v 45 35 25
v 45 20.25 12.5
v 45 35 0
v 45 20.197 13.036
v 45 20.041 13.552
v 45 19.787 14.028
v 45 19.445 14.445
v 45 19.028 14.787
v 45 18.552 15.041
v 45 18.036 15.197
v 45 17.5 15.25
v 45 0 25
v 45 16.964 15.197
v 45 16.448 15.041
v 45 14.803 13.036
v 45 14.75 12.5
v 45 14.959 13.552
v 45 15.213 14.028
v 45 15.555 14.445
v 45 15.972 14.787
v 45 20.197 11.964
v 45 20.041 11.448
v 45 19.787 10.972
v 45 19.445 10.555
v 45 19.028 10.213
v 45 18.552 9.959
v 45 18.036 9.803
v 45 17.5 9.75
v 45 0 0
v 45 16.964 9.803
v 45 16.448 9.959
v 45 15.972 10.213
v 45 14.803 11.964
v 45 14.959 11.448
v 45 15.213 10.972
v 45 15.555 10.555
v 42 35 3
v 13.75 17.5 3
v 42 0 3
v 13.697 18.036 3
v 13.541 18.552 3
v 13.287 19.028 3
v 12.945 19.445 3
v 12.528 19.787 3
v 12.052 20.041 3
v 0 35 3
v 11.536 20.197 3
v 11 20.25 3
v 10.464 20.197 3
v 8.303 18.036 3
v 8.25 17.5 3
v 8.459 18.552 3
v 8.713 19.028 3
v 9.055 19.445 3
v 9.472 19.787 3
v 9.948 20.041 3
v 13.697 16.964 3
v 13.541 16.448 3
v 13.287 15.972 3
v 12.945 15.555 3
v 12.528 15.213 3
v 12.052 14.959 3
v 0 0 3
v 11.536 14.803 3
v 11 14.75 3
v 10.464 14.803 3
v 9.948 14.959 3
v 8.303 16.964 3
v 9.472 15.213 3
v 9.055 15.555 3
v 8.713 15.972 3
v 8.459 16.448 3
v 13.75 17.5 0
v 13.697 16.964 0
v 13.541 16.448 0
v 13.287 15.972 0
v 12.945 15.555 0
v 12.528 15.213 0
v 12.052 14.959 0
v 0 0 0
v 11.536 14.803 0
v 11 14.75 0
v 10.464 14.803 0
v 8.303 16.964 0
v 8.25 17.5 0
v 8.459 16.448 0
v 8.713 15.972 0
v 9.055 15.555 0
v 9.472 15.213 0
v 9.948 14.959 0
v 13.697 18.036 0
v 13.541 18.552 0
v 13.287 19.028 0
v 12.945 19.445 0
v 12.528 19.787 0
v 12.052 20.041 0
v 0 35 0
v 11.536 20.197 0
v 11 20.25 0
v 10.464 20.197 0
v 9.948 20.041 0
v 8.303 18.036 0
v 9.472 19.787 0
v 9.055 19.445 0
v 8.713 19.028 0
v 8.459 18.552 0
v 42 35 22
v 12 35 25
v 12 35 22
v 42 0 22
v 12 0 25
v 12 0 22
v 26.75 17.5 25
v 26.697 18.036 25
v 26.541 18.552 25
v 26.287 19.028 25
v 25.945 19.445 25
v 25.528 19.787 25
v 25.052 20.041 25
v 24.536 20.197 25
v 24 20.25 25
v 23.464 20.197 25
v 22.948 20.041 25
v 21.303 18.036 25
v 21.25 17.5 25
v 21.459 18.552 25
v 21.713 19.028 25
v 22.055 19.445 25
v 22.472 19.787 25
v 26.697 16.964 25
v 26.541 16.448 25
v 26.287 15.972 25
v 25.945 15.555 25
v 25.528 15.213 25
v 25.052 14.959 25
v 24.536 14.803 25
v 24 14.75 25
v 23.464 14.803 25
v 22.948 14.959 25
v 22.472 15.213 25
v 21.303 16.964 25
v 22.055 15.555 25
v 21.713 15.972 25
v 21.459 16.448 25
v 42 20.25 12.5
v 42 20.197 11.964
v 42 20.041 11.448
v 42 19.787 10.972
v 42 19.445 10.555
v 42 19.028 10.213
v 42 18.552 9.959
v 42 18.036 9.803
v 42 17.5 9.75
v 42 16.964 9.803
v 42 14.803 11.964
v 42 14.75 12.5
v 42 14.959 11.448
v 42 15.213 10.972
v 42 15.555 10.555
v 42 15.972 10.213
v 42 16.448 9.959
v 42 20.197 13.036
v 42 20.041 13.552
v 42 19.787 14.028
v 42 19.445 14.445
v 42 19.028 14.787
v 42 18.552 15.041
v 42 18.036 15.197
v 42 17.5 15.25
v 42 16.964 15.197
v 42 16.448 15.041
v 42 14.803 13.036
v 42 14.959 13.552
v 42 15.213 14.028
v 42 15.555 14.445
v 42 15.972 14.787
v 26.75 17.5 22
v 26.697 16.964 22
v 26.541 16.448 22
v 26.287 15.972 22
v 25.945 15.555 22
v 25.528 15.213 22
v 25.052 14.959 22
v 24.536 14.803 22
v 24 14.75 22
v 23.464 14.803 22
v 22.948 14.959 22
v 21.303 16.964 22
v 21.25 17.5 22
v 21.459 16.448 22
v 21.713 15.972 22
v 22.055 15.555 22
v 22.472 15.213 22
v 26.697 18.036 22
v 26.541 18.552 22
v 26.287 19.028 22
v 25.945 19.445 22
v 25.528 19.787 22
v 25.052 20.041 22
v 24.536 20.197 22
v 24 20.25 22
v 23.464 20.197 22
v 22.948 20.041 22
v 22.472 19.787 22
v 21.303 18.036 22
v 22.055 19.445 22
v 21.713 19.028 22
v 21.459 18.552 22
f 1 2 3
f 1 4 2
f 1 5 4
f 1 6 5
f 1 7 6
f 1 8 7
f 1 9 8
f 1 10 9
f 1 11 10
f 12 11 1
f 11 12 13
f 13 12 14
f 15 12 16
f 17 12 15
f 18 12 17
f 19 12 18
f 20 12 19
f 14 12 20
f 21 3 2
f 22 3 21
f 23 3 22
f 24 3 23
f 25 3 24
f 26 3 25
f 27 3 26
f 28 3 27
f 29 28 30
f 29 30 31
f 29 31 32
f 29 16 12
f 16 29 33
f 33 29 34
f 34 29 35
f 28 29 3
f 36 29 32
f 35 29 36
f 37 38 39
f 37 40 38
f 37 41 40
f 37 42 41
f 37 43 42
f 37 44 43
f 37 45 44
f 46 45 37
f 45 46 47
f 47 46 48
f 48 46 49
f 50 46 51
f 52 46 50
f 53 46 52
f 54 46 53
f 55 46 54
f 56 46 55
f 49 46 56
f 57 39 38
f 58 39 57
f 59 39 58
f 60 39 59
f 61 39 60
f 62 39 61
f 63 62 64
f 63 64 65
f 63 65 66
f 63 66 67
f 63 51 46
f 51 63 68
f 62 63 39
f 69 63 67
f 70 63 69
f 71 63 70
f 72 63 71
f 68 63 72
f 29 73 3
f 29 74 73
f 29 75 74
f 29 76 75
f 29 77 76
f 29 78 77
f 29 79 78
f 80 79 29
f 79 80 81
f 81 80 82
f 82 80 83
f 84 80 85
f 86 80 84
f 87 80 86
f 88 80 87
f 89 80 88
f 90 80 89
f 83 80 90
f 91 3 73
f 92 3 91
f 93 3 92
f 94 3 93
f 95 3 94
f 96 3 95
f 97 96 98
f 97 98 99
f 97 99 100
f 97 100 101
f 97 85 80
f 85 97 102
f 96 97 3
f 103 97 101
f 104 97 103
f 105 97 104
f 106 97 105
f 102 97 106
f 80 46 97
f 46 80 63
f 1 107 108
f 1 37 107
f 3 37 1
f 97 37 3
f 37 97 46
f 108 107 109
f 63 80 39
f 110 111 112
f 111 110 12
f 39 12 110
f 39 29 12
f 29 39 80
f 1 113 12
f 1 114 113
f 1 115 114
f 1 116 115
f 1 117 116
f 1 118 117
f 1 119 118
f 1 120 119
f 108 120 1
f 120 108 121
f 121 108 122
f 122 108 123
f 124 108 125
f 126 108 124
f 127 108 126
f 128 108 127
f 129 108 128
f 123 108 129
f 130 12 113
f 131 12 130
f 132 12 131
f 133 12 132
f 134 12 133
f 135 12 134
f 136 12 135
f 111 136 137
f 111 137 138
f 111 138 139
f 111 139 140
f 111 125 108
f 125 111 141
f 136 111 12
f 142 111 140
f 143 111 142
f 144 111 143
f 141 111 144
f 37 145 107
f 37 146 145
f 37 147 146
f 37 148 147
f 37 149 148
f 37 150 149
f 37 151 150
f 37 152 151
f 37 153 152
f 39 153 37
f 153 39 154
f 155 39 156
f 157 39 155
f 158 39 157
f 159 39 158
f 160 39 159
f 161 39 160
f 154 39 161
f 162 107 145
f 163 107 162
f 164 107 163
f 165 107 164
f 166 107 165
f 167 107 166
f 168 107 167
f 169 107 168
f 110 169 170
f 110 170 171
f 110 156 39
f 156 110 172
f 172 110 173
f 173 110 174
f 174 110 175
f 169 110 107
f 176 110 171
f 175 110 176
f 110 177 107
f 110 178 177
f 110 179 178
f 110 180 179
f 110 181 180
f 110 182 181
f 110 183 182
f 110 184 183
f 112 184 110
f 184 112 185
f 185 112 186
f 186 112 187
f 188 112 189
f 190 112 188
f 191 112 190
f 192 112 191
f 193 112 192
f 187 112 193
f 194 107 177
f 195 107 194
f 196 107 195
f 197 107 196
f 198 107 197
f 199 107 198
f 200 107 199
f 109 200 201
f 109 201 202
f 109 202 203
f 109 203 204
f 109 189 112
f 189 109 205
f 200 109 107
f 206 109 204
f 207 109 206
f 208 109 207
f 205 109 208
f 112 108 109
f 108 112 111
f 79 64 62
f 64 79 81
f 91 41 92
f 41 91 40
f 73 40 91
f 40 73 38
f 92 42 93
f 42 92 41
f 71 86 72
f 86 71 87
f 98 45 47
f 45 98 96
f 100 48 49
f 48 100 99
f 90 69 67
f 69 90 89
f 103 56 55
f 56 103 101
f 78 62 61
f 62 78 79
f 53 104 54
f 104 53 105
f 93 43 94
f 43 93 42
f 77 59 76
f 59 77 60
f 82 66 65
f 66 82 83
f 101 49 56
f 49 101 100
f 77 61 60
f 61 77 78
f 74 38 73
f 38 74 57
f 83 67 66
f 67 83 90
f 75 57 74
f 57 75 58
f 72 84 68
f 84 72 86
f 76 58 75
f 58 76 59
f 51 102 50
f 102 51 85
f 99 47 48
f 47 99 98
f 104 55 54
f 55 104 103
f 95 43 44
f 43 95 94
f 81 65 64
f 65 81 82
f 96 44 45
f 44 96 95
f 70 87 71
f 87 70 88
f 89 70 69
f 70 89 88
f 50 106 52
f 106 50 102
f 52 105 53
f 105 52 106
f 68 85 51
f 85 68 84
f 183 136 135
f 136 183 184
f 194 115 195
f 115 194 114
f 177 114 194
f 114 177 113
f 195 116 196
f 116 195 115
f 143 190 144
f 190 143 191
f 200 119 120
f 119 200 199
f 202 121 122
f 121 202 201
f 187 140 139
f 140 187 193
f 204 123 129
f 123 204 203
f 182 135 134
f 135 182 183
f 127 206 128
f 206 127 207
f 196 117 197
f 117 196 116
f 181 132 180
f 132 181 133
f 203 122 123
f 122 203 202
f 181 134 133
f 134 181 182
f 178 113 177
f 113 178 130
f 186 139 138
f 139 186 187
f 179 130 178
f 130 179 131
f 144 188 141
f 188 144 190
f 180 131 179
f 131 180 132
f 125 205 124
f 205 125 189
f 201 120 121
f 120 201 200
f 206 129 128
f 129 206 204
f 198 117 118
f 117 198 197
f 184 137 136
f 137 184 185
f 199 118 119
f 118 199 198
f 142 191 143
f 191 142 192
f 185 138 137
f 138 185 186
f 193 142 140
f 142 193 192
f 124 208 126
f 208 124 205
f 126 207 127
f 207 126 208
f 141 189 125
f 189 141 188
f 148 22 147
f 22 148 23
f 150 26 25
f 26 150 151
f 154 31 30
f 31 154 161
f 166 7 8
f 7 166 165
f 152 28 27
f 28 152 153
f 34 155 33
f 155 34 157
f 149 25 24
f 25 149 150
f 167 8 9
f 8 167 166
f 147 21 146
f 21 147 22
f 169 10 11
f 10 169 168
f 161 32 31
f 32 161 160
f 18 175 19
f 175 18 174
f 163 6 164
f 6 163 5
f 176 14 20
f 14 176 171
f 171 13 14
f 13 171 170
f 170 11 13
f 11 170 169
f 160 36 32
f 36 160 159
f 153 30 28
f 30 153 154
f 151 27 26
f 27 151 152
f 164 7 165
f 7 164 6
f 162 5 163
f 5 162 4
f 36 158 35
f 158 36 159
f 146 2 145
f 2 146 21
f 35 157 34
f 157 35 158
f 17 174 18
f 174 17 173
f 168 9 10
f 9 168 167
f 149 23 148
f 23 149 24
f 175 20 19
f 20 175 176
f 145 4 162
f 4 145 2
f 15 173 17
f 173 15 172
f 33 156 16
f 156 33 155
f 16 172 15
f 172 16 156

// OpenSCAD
$fn = 32;

// ----------------------------------------------------------------------
// Z-bracket: 45 x 35 x 25 mm
// ----------------------------------------------------------------------

// --- parameters (mm) ---
lower_leg = 45;           // lower foot length, X
upper_leg = 30;           // upper foot length, X
bracket_w = 35;           // bracket width, Y
offset_h = 25;            // overall rise, Z
sheet_t = 3;              // plate thickness
hole_d = 5.5;             // clearance for M5

module hole_z(px, py, z0) {
  translate([px, py, z0 - 2.5]) cylinder(h = sheet_t + 5, d = hole_d);
}
module hole_x(py, pz) {
  translate([-2.5, py, pz]) rotate([0, 90, 0]) cylinder(h = sheet_t + 5, d = hole_d);
}

difference() {
  union() {
    cube([lower_leg, bracket_w, sheet_t]);
    /* web, overlapping the lower foot */
    translate([lower_leg - sheet_t, 0, 0]) cube([sheet_t, bracket_w, offset_h]);
    /* upper foot, sunk into the web */
    translate([lower_leg - sheet_t - upper_leg, 0, offset_h - sheet_t]) cube([upper_leg + sheet_t, bracket_w, sheet_t]);
  }
  hole_z(11, 17.5, 0);
  translate([lower_leg - sheet_t - 18, 0, 0]) hole_z(0, 17.5, offset_h - sheet_t);
  translate([lower_leg - sheet_t, 0, 0]) hole_x(17.5, 12.5);
}
